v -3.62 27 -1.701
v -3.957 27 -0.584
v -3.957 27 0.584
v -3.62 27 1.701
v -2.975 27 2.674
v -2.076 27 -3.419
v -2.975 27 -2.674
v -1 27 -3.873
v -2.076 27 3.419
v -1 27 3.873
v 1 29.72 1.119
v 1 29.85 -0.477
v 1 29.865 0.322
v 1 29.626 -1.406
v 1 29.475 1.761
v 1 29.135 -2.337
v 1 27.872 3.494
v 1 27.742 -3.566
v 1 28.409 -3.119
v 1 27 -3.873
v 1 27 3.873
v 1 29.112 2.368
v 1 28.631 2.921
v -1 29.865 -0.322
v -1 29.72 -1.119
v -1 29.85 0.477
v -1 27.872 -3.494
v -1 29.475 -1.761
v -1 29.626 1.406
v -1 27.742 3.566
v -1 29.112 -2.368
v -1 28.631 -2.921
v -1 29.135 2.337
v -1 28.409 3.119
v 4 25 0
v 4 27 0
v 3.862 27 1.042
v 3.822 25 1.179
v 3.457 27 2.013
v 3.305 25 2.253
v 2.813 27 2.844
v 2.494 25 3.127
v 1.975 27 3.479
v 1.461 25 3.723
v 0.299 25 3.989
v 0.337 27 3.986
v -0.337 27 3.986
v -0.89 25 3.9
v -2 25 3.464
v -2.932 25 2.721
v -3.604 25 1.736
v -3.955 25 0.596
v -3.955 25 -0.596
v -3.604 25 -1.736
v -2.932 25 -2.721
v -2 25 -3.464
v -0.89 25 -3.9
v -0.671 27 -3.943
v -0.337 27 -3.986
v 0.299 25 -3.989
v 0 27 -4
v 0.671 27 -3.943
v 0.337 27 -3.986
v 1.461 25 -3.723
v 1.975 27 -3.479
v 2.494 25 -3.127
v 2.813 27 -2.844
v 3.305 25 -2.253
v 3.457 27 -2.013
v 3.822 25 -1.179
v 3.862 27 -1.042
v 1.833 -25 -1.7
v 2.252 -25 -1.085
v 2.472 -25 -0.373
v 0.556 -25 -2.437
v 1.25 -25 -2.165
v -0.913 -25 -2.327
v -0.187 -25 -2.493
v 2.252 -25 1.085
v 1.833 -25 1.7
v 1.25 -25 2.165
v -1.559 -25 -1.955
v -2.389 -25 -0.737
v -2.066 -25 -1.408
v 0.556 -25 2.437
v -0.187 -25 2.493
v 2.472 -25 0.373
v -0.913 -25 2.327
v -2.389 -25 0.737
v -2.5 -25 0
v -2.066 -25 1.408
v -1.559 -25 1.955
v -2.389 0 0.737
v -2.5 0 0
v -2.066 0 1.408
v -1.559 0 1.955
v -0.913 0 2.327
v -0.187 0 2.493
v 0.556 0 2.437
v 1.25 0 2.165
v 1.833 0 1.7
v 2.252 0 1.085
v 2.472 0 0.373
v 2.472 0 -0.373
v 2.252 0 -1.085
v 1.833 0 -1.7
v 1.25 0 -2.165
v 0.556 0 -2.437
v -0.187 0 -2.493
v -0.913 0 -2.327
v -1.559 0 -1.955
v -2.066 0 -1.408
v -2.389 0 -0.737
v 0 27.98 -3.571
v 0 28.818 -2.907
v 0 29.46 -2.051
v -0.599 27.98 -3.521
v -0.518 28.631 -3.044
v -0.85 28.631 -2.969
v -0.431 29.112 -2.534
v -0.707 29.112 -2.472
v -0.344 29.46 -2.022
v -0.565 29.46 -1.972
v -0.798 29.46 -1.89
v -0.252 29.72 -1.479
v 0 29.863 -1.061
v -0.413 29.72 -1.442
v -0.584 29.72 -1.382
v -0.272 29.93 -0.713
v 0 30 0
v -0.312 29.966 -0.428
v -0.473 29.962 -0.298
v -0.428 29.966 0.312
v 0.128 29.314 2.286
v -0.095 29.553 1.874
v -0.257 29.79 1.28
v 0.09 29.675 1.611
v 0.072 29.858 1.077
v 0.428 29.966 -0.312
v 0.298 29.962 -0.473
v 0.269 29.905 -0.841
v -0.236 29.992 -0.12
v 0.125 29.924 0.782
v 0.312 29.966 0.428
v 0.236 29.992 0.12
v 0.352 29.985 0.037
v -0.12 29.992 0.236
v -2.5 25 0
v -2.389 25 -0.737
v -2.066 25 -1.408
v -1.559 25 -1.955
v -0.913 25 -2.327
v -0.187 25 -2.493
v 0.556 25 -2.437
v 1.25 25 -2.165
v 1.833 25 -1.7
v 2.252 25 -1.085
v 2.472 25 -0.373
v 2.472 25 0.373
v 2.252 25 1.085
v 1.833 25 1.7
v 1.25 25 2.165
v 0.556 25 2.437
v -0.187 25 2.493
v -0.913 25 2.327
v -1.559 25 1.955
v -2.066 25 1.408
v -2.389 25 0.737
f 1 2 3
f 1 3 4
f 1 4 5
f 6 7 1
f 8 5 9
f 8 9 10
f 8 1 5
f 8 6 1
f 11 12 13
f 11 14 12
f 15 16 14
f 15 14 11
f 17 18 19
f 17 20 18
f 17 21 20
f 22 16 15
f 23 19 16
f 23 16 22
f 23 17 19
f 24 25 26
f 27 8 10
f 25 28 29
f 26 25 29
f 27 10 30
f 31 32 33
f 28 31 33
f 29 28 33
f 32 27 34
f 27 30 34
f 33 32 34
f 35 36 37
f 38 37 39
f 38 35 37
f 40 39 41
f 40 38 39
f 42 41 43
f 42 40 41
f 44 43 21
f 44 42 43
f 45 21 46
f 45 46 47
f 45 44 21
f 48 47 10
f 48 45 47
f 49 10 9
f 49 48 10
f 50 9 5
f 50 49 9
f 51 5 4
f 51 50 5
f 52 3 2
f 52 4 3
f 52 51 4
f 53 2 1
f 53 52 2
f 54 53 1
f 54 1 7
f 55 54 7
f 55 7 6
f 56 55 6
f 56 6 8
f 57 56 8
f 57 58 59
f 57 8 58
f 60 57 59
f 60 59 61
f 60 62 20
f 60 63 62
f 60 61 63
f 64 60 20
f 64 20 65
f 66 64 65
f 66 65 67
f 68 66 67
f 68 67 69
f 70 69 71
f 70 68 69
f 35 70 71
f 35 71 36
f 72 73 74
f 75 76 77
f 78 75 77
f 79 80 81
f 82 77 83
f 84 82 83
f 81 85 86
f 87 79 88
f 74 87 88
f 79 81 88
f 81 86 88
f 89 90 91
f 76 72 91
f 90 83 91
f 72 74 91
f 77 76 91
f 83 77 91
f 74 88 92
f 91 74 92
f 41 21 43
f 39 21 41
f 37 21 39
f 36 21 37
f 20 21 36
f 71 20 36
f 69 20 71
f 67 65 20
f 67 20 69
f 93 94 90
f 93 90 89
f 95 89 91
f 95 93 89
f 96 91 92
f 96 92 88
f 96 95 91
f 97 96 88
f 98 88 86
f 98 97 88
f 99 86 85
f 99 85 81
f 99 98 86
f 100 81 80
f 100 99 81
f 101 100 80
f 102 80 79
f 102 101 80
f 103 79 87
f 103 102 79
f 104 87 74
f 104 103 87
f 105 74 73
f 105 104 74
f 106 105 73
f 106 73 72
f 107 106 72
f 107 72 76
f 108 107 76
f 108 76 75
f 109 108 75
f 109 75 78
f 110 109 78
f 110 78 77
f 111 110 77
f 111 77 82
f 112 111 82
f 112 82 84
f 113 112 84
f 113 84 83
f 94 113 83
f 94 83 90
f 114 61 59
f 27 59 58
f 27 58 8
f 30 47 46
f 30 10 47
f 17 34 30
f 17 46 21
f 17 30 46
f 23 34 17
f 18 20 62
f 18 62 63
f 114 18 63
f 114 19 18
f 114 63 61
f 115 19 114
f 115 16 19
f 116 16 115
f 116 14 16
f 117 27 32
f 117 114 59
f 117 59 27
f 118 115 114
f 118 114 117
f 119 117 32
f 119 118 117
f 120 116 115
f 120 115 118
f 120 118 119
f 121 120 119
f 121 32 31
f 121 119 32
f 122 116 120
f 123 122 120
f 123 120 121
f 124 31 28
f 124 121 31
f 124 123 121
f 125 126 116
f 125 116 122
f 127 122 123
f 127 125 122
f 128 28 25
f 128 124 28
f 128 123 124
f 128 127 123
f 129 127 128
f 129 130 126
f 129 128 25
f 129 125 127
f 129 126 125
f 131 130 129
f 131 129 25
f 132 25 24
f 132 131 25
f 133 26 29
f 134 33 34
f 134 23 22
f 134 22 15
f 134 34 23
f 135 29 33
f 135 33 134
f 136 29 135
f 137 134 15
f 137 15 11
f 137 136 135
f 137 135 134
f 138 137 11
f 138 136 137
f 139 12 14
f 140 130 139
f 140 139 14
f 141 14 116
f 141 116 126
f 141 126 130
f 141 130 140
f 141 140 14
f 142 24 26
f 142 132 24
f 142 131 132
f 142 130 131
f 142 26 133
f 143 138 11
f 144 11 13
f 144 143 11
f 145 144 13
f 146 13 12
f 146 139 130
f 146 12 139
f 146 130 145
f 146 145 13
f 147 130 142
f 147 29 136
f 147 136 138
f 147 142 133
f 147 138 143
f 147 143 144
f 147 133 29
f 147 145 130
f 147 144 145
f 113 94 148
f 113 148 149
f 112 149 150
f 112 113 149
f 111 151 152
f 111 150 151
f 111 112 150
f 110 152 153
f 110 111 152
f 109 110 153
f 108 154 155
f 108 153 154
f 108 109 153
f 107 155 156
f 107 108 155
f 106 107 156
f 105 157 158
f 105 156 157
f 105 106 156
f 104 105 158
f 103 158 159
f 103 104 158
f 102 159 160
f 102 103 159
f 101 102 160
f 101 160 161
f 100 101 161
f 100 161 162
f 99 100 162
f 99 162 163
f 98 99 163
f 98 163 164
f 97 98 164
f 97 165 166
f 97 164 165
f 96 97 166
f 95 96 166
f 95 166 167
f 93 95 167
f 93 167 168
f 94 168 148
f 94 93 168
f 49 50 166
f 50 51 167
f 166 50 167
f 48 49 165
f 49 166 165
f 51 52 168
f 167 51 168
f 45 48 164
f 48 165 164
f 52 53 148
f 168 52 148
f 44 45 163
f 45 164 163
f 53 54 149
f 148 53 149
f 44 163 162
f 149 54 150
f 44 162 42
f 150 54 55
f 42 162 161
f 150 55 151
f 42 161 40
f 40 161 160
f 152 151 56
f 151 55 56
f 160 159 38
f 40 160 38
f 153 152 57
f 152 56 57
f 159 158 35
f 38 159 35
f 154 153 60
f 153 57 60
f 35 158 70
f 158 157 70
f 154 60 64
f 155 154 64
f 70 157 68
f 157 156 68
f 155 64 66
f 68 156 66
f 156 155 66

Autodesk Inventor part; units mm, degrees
ref_plane "YZ Plane" through (0, 0, 0) normal (1, 0, 0) x (0, 1, 0)
ref_plane "XZ Plane" through (0, 0, 0) normal (0, 1, 0) x (-1, 0, 0)
ref_plane "XY Plane" through (0, 0, 0) normal (0, 0, 1) x (1, 0, 0)
sketch "Sketch1" plane through (0, 0, 0) normal (0, 1, 0) x (-1, 0, 0)
  circle A0 centre (0, 0) radius 2.5
  dimension "d0" = 5
extrude "Extrusion1" add sketch "Sketch1" along normal mid plane 50
sketch "Sketch9" plane through (0, 25, 0) normal (0, 1, 0) x (1, 0, 0)
  circle A0 centre (0, 0) radius 4
  dimension "d56" = 8
extrude "Extrusion2" add sketch "Sketch9" along normal blind 2
sketch "Sketch10" plane through (0, 0, 0) normal (1, 0, 0) x (0, 1, 0)
  line L0 (27, 4) -> (30, 4)
  line L1 (30, 4) -> (30, -4)
  line L2 (30, -4) -> (27, -4)
  line L3 (27, -4) -> (27, 4)
  line L4 (27, -4) -> (27, 4) projected
  point P0 (0, 0)
  point P1 (27, 0)
  point P2 (30, 0)
  dimension "d59" = 8
  dimension "d60" = 3
extrude "Extrusion3" add sketch "Sketch10" along normal mid plane 2
sketch "Sketch11" plane through (0, 0, 0) normal (1, 0, 0) x (0, 1, 0)
  line L0 (32, 0) -> (32, -5)
  line L1 (27, -4) -> (27, -5)
  line L2 (27, -5) -> (32, -5)
  line L3 (30, 4) -> (30, -4) projected
  line L4 (32, 0) -> (30, 0)
  line L5 (-36.2, 0) -> (42.2, 0) projected
  line L6 (30, -4) -> (27, -4) projected
  arc A0 (27, -4) -> (30, 0) centre (25.8333, 0) ccw
  point P0 (0, 0)
  point P1 (27, 4)
  point P2 (31, 0)
  point P3 (27, -3.873)
  dimension "d65" = 5
  dimension "d68" = 2
revolve "Revolution5" cut sketch "Sketch11" angle 360 about axis through (0, -10, 0) along (0, 1, 0)
thread "Thread4" size "M5x0.8" class "6g" standard "ANSI Metric M Profile" length 40
equation "\"d23\" = 55deg"
equation "\"Sketch3_Pitch\" = 0.8"
equation "\"d44\" = 55deg"
equation "\"Sketch6_Pitch\" = 1.27"
properties part number "LeadScrew"
